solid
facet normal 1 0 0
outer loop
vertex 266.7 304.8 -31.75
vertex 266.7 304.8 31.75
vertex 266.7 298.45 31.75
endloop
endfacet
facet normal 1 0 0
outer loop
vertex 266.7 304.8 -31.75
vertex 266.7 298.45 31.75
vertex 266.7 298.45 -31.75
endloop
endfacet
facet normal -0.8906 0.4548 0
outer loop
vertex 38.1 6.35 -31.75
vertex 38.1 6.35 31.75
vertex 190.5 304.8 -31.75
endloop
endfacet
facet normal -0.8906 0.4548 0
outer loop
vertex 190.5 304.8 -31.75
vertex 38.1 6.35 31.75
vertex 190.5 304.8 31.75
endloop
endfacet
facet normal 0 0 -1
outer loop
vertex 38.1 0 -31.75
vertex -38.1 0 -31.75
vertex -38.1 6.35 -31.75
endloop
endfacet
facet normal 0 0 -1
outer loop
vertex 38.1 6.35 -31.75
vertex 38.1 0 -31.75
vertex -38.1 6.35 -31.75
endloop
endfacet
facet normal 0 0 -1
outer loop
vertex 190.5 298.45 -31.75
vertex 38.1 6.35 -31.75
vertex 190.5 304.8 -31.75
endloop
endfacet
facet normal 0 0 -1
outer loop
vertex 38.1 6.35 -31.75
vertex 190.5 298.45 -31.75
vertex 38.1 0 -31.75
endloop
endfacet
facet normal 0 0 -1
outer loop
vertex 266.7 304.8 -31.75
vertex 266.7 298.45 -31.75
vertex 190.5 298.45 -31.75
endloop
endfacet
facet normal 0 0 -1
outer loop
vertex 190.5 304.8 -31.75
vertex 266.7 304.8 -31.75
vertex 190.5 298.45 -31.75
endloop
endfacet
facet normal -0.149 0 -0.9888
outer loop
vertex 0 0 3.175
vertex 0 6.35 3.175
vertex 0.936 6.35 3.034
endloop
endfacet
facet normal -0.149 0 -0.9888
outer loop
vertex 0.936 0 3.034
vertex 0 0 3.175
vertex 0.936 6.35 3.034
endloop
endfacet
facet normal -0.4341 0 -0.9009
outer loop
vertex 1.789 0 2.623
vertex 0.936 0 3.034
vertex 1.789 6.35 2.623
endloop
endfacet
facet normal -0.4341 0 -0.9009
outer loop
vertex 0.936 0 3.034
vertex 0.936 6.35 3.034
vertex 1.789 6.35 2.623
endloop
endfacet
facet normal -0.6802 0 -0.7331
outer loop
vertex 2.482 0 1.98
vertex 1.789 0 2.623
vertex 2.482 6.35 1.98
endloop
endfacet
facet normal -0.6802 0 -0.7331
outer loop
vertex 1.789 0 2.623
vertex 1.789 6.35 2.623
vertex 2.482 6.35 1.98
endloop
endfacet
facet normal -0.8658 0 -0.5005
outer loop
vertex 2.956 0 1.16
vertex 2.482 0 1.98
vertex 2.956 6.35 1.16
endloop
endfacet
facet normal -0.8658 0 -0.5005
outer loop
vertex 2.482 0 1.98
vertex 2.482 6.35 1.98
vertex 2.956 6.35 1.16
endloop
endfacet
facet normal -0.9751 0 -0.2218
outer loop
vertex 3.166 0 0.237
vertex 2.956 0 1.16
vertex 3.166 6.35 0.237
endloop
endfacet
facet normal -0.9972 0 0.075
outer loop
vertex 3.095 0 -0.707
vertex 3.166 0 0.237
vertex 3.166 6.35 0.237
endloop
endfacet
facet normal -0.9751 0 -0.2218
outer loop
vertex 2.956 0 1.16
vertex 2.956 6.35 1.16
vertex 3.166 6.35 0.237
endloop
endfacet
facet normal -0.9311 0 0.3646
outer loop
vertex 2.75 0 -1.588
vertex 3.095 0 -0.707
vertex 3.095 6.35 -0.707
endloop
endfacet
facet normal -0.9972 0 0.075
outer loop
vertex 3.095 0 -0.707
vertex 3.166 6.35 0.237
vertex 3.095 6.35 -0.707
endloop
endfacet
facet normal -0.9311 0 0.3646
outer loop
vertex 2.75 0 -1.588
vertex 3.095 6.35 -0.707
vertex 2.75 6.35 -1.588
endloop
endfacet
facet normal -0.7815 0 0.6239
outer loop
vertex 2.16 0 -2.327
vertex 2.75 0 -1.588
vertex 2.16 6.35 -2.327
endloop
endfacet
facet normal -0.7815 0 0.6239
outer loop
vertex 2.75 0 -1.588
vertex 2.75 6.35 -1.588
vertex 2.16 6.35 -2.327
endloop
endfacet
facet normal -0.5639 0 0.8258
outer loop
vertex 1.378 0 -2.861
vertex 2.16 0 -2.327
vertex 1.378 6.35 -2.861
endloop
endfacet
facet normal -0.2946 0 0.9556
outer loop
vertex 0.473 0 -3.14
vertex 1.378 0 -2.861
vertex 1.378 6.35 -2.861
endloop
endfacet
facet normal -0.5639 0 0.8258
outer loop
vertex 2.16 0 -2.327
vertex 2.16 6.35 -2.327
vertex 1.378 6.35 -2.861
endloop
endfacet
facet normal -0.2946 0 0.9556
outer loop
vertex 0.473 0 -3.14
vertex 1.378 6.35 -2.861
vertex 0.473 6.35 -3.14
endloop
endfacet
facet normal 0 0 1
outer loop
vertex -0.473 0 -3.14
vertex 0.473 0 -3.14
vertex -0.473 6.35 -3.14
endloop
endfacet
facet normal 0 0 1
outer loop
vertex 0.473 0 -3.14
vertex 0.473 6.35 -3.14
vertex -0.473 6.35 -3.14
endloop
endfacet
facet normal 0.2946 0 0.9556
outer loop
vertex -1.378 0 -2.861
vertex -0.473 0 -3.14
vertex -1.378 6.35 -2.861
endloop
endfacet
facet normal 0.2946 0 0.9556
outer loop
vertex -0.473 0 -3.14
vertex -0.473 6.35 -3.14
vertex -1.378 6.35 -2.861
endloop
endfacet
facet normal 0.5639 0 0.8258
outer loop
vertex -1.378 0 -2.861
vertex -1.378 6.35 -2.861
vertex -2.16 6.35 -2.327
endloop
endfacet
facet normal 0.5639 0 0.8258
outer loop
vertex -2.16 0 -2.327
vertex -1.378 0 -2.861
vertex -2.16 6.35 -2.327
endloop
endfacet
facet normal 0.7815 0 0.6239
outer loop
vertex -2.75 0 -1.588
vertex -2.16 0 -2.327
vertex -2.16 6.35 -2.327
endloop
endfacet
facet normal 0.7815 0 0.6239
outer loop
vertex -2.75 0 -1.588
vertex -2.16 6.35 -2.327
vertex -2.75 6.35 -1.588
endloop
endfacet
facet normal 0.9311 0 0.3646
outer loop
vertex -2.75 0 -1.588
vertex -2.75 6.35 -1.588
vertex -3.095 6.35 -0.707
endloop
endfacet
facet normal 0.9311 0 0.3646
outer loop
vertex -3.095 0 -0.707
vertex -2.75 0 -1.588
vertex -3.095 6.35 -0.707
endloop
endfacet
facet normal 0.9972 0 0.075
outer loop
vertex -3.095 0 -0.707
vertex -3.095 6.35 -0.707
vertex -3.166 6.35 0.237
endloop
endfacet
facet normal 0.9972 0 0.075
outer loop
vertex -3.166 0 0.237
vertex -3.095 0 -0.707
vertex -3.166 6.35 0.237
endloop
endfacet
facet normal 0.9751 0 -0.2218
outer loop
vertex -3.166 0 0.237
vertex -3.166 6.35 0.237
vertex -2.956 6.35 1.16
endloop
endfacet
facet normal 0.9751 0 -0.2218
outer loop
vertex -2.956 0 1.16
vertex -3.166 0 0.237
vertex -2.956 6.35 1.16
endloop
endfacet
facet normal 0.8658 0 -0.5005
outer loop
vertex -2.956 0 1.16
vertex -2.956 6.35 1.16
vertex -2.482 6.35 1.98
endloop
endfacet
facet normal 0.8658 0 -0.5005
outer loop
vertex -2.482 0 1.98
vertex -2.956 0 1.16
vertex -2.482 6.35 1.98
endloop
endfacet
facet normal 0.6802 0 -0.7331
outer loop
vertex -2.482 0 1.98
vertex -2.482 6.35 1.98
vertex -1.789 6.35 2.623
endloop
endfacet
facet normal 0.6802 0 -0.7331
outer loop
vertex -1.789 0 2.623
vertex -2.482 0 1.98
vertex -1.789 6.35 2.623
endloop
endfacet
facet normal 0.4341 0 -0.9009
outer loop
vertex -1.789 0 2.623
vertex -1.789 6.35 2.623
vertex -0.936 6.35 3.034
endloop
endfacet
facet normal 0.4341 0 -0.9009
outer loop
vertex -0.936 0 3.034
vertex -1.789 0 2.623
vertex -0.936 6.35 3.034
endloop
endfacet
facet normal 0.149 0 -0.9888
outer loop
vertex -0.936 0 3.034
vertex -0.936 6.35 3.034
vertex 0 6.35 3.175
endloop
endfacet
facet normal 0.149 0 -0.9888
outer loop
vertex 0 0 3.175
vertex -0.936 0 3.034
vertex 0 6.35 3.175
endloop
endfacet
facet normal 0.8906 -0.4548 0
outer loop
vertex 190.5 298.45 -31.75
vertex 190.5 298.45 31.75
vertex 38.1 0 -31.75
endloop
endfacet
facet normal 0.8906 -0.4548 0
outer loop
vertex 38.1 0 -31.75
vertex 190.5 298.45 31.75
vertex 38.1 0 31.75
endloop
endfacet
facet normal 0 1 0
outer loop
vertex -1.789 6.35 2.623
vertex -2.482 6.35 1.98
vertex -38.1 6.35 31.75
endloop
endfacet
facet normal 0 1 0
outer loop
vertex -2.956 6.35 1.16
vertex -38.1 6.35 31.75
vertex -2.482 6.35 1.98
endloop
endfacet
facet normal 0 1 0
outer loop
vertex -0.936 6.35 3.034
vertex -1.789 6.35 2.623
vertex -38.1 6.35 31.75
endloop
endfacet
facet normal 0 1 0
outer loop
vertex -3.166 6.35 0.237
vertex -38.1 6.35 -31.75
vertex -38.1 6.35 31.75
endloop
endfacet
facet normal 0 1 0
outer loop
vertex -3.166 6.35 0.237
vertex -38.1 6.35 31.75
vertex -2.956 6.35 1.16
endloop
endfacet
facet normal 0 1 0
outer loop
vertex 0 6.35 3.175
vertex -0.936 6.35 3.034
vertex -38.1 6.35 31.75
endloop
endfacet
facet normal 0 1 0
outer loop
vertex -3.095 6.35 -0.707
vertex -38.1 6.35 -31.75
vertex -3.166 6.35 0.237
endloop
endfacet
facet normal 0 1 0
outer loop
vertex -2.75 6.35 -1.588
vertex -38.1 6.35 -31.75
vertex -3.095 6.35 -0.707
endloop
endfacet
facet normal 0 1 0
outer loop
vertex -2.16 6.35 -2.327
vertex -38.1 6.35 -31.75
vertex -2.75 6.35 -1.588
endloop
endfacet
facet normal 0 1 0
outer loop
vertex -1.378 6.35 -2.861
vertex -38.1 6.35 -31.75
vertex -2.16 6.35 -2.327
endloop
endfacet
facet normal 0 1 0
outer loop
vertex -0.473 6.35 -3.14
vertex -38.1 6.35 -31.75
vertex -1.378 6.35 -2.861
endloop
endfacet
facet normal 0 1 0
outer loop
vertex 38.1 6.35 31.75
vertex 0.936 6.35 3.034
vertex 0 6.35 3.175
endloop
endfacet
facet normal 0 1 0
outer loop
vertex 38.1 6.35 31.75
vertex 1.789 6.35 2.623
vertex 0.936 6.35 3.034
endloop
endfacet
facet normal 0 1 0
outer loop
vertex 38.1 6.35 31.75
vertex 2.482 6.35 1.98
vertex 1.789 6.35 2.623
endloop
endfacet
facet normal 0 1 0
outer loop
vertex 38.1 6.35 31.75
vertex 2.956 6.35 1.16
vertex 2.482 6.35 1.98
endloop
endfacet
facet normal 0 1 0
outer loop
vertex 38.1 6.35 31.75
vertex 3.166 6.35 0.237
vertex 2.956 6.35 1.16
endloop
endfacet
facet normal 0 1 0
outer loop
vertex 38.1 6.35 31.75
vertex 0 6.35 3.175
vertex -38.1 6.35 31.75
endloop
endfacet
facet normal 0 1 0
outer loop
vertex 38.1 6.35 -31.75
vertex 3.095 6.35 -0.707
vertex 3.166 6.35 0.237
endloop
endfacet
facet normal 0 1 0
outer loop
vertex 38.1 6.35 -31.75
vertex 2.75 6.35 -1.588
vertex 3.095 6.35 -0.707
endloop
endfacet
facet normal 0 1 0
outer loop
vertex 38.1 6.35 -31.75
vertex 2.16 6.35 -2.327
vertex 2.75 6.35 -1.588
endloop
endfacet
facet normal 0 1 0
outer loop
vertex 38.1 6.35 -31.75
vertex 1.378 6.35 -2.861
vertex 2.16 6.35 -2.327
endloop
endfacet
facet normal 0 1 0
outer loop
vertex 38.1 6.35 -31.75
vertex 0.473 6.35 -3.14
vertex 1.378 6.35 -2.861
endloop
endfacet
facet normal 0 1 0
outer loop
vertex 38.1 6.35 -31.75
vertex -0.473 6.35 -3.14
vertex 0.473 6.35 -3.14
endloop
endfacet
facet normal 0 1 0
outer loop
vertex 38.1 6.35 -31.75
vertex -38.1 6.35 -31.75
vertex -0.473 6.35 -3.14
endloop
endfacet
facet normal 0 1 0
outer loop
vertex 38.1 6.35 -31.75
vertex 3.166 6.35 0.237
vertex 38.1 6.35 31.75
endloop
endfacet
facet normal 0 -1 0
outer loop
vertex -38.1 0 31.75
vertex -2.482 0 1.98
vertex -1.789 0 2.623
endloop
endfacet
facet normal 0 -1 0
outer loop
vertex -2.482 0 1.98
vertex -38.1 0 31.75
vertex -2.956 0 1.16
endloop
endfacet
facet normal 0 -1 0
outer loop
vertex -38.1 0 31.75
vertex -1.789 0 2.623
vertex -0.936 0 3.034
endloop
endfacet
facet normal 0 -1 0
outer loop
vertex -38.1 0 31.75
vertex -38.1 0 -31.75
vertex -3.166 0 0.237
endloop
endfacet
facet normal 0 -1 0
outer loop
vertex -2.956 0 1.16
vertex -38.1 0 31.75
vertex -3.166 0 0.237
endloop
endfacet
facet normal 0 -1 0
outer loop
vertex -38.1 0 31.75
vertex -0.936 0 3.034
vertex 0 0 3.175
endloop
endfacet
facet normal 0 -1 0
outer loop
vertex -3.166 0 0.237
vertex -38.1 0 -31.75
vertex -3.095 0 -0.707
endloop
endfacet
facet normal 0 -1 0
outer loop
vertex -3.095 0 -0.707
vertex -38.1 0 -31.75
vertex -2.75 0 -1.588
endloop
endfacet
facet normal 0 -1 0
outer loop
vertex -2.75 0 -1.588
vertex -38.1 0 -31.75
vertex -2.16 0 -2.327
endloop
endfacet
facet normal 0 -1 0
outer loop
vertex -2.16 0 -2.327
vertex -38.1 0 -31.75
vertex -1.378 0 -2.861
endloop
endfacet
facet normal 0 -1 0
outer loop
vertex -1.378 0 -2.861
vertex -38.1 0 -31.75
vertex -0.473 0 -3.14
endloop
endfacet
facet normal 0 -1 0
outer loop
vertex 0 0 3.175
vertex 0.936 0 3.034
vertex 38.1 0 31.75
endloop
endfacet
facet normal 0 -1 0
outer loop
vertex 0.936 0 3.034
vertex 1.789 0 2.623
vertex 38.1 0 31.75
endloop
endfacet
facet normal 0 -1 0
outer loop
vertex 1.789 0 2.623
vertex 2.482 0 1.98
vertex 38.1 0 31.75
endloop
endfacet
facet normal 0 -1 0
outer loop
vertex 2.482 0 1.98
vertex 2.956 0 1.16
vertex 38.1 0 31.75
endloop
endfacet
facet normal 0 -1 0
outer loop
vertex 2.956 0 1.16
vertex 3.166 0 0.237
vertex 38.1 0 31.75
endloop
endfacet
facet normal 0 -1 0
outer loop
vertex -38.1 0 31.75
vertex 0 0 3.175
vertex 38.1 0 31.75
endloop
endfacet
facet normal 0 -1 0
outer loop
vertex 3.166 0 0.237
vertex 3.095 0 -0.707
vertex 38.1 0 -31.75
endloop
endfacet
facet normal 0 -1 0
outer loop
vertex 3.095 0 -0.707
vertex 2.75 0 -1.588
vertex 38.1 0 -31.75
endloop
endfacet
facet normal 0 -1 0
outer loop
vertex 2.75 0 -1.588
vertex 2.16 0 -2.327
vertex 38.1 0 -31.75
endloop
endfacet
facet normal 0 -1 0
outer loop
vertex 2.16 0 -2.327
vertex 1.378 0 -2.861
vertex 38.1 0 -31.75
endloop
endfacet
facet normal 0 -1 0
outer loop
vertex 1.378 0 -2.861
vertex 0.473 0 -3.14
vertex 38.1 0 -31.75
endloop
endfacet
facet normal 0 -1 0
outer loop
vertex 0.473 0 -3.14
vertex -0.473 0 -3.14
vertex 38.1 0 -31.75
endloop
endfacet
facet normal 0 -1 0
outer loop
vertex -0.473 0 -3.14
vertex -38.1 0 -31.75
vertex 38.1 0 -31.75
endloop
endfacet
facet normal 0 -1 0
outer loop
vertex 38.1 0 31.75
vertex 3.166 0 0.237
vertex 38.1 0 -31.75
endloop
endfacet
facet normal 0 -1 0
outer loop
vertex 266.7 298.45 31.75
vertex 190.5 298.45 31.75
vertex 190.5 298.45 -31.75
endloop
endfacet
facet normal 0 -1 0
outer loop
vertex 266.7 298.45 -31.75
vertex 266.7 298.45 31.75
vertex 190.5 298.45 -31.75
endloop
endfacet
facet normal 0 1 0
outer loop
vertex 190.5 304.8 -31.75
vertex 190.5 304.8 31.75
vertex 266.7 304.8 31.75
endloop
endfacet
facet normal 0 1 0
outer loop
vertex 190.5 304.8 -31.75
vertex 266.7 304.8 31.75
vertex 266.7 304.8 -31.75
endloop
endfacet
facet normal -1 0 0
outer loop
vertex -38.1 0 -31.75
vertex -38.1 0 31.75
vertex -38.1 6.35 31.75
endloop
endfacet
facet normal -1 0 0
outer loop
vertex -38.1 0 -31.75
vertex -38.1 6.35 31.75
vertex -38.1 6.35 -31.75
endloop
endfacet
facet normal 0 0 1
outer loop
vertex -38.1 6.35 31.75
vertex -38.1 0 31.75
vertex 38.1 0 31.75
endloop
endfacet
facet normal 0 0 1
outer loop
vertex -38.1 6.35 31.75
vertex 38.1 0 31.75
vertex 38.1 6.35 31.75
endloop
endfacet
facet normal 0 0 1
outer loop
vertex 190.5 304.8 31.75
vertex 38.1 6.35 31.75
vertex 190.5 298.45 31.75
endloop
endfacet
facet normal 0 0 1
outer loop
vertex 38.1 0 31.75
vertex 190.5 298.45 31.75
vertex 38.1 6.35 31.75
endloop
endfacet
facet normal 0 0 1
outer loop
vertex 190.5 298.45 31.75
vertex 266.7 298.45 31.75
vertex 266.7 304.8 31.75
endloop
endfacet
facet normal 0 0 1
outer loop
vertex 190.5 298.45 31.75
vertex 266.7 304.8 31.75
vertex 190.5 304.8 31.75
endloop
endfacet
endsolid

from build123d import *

# Parameters (mm, degrees)
SKETCH1_W           = 76.2
SKETCH1_H           = 63.5
BOSS_EXTRUDE1_DEPTH = 6.35
SKETCH2_R           = 3.175
CUT_EXTRUDE1_DEPTH  = 50.99995
BOSS_EXTRUDE2_DEPTH = 63.5
SKETCH4_W           = 63.5
SKETCH4_H           = 6.35
BOSS_EXTRUDE3_DEPTH = 76.2


with BuildPart() as part:
    # Sketch1 → Boss-Extrude1 (new body)
    with BuildSketch(Plane(origin=(0, 0, 0), x_dir=(1, 0, 0), z_dir=(0, 1, 0))):
        Rectangle(SKETCH1_W, SKETCH1_H)
    extrude(amount=BOSS_EXTRUDE1_DEPTH)

    # Sketch2 → Cut-Extrude1 (cut, through all)
    with BuildSketch(Plane(origin=(0, 6.35, 0), x_dir=(1, 0, 0), z_dir=(0, 1, 0))):
        with Locations(Location((0, 0, 0), (0, 0, 270))):
            Circle(SKETCH2_R)
    extrude(amount=-CUT_EXTRUDE1_DEPTH, mode=Mode.SUBTRACT)

    # Sketch3 → Boss-Extrude2 (add)
    with BuildSketch(Plane.XY.offset(31.75)):
        Polygon((38.1, 6.35), (190.5, 304.8), (190.5, 298.45), (38.1, 0), align=None)
    extrude(amount=-BOSS_EXTRUDE2_DEPTH)

    # Sketch4 → Boss-Extrude3 (add)
    with BuildSketch(Plane(origin=(190.5, 0, 0), x_dir=(0, 0, -1), z_dir=(1, 0, 0))):
        with Locations((0, 301.625)):
            Rectangle(SKETCH4_W, SKETCH4_H)
    extrude(amount=BOSS_EXTRUDE3_DEPTH)


solid = part.part
